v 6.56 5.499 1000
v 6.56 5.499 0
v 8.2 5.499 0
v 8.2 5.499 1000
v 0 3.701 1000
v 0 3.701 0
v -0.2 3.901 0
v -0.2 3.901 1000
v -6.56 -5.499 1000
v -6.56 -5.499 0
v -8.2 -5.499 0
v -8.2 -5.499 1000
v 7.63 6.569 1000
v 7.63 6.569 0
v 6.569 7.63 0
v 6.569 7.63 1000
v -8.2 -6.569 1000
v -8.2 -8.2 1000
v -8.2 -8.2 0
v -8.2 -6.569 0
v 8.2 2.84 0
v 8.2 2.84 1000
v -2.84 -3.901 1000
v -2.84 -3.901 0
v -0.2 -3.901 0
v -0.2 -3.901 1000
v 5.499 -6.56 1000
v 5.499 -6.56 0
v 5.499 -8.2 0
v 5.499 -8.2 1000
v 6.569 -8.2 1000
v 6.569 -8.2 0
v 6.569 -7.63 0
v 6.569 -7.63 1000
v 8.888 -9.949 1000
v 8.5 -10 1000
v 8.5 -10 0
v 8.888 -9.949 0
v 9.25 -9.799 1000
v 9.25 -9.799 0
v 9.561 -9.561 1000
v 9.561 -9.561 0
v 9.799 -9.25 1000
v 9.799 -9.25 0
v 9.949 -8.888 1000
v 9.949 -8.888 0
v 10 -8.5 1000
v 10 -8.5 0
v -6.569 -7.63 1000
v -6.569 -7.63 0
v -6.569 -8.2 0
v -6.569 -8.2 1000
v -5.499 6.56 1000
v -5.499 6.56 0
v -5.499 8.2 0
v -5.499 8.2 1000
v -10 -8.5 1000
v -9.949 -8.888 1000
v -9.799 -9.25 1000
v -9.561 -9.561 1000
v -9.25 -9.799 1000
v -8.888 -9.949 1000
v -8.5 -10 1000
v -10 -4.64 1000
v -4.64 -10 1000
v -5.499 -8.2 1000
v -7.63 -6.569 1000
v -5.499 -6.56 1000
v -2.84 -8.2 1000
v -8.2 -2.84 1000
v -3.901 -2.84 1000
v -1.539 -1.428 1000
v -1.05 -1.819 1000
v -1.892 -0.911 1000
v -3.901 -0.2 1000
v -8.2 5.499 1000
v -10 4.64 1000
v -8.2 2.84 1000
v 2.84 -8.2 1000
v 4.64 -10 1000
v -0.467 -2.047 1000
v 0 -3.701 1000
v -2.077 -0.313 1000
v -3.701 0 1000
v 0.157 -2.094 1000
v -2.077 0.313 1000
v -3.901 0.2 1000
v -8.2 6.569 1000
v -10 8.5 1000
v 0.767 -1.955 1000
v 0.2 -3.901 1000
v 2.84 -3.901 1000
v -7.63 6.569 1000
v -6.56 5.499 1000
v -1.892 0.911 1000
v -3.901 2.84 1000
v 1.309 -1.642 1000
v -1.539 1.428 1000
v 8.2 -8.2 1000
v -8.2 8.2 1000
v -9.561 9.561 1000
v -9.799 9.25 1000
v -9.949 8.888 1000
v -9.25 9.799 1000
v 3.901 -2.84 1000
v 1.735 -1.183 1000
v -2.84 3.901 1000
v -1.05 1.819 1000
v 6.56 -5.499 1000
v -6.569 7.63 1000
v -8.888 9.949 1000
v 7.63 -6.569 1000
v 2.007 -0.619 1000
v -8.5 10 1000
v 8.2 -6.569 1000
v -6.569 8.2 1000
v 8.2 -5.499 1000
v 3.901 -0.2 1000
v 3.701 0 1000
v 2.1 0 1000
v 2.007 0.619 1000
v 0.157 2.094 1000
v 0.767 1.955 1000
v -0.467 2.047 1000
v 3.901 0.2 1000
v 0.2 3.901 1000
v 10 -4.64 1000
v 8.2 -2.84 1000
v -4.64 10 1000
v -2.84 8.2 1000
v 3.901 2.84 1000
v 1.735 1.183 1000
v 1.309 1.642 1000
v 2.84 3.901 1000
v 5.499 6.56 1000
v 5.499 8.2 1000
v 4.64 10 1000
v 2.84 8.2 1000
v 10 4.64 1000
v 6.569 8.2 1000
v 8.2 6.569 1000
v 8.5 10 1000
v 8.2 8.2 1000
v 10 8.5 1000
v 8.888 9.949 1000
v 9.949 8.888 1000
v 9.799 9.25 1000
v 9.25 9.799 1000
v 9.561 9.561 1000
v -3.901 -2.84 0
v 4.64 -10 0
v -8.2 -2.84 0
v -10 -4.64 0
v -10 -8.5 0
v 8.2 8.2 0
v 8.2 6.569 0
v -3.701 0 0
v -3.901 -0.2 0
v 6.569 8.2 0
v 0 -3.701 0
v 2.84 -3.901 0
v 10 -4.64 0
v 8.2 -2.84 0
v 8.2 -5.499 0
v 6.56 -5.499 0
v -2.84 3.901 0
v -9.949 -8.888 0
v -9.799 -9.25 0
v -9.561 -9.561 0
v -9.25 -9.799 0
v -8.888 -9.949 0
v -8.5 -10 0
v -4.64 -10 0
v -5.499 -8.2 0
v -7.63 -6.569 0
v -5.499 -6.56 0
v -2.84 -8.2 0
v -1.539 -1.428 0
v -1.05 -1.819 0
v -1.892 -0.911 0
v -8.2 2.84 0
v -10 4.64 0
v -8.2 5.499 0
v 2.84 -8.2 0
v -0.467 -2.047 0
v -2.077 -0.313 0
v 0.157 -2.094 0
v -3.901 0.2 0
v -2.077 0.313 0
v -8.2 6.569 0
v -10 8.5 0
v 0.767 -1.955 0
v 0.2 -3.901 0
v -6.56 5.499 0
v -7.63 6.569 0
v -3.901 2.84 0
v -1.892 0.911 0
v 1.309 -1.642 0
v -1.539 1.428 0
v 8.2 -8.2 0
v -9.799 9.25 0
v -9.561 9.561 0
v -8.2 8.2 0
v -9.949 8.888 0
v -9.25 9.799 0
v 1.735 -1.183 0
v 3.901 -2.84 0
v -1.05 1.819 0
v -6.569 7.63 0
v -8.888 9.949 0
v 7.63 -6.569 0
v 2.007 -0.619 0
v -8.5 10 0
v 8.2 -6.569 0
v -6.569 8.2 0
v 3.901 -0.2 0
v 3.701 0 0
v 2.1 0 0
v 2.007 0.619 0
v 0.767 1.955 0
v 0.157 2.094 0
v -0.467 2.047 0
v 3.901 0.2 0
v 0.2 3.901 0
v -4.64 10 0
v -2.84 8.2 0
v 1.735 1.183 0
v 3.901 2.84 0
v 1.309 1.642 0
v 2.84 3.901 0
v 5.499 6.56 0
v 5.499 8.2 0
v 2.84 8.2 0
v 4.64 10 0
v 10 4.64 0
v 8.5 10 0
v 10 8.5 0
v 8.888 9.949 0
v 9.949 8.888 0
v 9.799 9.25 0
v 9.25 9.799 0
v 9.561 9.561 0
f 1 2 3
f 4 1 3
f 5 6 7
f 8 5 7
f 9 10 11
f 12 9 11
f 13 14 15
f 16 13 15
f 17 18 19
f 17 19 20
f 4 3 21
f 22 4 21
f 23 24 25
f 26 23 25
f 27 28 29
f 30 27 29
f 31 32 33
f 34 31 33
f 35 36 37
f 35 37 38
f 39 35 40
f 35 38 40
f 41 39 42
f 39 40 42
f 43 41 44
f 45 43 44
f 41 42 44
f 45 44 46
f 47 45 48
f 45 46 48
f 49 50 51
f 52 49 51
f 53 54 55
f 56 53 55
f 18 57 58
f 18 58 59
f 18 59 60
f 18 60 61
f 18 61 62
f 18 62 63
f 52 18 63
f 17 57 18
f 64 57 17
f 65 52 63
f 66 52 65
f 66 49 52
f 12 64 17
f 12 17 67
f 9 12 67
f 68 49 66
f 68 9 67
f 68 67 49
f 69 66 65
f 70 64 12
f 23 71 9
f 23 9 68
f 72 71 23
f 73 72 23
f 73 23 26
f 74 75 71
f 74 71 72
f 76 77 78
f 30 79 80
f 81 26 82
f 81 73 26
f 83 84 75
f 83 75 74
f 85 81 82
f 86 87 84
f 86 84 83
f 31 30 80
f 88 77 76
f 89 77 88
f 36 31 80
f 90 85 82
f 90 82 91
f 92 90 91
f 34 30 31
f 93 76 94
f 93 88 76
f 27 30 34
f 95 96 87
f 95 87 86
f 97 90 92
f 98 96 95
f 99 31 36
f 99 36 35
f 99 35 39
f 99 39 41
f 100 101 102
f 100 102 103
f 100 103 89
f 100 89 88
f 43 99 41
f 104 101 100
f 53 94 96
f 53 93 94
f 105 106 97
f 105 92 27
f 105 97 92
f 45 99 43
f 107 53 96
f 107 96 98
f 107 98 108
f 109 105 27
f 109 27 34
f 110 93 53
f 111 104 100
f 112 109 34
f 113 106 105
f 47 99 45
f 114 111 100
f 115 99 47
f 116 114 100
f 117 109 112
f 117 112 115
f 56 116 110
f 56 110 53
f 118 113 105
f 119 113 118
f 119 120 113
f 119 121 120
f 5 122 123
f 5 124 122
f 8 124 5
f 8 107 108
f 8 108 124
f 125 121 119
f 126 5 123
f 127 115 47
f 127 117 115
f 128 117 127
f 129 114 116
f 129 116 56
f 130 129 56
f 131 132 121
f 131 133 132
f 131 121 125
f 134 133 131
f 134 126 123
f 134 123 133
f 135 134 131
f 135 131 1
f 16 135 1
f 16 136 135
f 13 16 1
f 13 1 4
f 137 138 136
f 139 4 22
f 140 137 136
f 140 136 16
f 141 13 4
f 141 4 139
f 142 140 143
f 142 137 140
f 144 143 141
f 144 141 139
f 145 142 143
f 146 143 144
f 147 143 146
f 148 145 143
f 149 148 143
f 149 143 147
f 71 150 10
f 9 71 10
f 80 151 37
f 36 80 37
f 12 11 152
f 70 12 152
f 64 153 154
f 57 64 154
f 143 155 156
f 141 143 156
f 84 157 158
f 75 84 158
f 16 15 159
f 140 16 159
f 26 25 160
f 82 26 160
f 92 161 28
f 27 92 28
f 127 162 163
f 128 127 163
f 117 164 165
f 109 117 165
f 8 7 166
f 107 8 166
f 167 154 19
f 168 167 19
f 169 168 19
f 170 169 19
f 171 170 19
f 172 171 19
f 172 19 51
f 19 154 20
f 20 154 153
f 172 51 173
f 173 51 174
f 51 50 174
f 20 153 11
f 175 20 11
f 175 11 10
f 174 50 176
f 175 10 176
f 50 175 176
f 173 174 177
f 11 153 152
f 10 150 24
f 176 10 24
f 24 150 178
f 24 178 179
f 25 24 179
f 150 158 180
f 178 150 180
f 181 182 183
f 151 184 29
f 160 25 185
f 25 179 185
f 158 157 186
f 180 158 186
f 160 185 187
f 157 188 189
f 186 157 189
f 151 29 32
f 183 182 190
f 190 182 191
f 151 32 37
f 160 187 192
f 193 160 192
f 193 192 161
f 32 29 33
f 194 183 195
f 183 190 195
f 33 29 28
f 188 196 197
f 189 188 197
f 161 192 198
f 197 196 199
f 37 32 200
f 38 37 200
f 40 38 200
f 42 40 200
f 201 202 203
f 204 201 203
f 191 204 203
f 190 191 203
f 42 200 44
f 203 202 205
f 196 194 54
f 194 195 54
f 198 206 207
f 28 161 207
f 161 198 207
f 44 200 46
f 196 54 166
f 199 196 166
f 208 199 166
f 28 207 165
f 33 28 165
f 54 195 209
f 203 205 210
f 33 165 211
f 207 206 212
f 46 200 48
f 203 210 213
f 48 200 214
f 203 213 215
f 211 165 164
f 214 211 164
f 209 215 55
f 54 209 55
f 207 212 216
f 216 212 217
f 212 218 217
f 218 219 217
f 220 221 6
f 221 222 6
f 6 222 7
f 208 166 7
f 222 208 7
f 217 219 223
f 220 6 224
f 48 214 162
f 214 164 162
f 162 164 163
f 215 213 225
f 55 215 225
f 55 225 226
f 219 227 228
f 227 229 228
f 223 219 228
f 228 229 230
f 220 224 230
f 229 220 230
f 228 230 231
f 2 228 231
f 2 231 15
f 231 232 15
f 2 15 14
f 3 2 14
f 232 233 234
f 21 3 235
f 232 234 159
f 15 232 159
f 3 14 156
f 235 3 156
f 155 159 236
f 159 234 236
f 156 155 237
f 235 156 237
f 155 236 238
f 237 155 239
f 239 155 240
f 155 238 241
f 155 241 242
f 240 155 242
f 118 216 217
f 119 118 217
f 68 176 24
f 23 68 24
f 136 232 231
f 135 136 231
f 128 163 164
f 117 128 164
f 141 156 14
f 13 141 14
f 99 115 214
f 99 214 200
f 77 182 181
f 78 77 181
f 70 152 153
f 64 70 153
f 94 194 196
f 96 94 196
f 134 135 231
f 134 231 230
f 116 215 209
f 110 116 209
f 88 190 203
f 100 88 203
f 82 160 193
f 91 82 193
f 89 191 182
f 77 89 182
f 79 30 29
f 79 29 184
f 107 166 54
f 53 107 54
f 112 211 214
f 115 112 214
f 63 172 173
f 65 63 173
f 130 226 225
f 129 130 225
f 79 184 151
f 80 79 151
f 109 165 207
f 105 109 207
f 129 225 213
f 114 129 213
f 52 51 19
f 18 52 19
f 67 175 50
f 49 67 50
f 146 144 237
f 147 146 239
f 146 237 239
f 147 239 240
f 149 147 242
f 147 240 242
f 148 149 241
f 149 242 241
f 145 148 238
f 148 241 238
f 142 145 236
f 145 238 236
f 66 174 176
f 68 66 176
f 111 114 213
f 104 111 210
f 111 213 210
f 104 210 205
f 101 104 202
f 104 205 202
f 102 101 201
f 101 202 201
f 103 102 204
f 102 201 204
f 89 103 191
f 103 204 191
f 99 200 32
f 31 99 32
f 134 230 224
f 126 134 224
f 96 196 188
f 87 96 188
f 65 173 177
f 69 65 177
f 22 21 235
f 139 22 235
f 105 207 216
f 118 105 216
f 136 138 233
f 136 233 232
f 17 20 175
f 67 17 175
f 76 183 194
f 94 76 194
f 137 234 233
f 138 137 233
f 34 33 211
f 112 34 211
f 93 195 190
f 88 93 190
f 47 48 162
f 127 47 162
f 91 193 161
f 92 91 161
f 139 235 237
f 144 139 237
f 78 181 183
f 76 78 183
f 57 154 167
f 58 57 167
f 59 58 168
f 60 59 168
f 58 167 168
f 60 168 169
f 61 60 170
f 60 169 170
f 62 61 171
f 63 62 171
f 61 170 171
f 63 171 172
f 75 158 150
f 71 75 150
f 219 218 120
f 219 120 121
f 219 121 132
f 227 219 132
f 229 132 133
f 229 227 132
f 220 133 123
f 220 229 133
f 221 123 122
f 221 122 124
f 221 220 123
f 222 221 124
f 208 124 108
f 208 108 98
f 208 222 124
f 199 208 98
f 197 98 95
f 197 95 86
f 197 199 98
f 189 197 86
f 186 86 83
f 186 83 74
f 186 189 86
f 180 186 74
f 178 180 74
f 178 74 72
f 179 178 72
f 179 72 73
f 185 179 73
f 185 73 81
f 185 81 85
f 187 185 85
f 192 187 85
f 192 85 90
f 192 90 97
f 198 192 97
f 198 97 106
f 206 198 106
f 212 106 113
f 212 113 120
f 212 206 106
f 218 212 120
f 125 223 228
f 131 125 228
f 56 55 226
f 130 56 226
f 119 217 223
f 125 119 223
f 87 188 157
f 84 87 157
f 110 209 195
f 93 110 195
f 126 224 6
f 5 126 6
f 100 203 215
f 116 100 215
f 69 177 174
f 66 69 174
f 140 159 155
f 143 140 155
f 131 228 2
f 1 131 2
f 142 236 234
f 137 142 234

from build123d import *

# Parameters (mm, degrees)
F0_R     = 2.09999979
F1_DEPTH = 1000


# Not quite as in the source:
# - ends of sketch curves that miss each other by under 0.0002 mm in the source are joined


with BuildPart() as f1:
    # F0 (on Top) → F1 (new body)
    with BuildSketch(Plane.XY):
        with BuildLine():
            Line((-4.639999536, 10), (-8.50000015, 10))
            ThreePointArc((-8.50000015, 10), (-9.5606602157, 9.5606602157), (-10, 8.50000015))
            Line((-10, 8.50000015), (-10, 4.639999536))
            Line((-10, 4.639999536), (-8.19999818, 2.839999716))
            Line((-8.19999818, 2.839999716), (-8.19999818, 5.4993384501))
            Line((-8.19999818, 5.4993384501), (-6.559999344, 5.4993384501))
            Line((-6.559999344, 5.4993384501), (-3.9006596099, 2.839999716))
            Line((-3.9006596099, 2.839999716), (-3.9006596099, 0.19999898))
            Line((-3.9006596099, 0.19999898), (-3.7006596299, -1e-06))
            Line((-3.7006596299, -1e-06), (-3.9006596099, -0.20000098))
            Line((-3.9006596099, -0.20000098), (-3.9006596099, -2.840000716))
            Line((-3.9006596099, -2.840000716), (-6.559999344, -5.4993404501))
            Line((-6.559999344, -5.4993404501), (-8.19999818, -5.4993404501))
            Line((-8.19999818, -5.4993404501), (-8.19999818, -2.840000716))
            Line((-8.19999818, -2.840000716), (-10, -4.640000536))
            Line((-10, -4.640000536), (-10, -8.50000115))
            ThreePointArc((-10, -8.50000115), (-9.5606602157, -9.5606612157), (-8.50000015, -10.000001))
            Line((-8.50000015, -10.000001), (-4.639999536, -10))
            Line((-4.639999536, -10), (-2.839999716, -8.20000018))
            Line((-2.839999716, -8.20000018), (-5.4993394501, -8.20000018))
            Line((-5.4993394501, -8.20000018), (-5.4993394501, -6.560000344))
            Line((-5.4993394501, -6.560000344), (-2.839999716, -3.9006606099))
            Line((-2.839999716, -3.9006606099), (-0.19999898, -3.9006606099))
            Line((-0.19999898, -3.9006606099), (1e-06, -3.7006606299))
            Line((1e-06, -3.7006606299), (0.20000098, -3.9006606099))
            Line((0.20000098, -3.9006606099), (2.839999716, -3.9006606099))
            Line((2.839999716, -3.9006606099), (5.4993414501, -6.560000344))
            Line((5.4993414501, -6.560000344), (5.4993414501, -8.20000018))
            Line((5.4993414501, -8.20000018), (2.839999716, -8.20000018))
            Line((2.839999716, -8.20000018), (4.639999536, -10))
            Line((4.639999536, -10), (8.50000015, -10))
            ThreePointArc((8.50000015, -10), (9.5606602157, -9.5606612157), (10, -8.50000115))
            Line((10, -8.50000115), (10, -4.640000536))
            Line((10, -4.640000536), (8.20000018, -2.840000716))
            Line((8.20000018, -2.840000716), (8.20000018, -5.4993404501))
            Line((8.20000018, -5.4993404501), (6.560000344, -5.4993404501))
            Line((6.560000344, -5.4993404501), (3.9006596099, -2.840000716))
            Line((3.9006596099, -2.840000716), (3.9006596099, -0.20000098))
            Line((3.9006596099, -0.20000098), (3.7006596299, -1e-06))
            Line((3.7006596299, -1e-06), (3.9006596099, 0.19999898))
            Line((3.9006596099, 0.19999898), (3.9006596099, 2.839999716))
            Line((3.9006596099, 2.839999716), (6.560000344, 5.4993384501))
            Line((6.560000344, 5.4993384501), (8.20000018, 5.4993384501))
            Line((8.20000018, 5.4993384501), (8.20000018, 2.839999716))
            Line((8.20000018, 2.839999716), (10, 4.639999536))
            Line((10, 4.639999536), (10, 8.50000015))
            ThreePointArc((10, 8.50000015), (9.5606602157, 9.5606602157), (8.50000015, 10))
            Line((8.50000015, 10), (4.639999536, 10))
            Line((4.639999536, 10), (2.839999716, 8.20000018))
            Line((2.839999716, 8.20000018), (5.4993414501, 8.20000018))
            Line((5.4993414501, 8.20000018), (5.4993414501, 6.559998344))
            Line((5.4993414501, 6.559998344), (2.839999716, 3.9006596099))
            Line((2.839999716, 3.9006596099), (0.20000098, 3.9006596099))
            Line((0.20000098, 3.9006596099), (1e-06, 3.7006596299))
            Line((1e-06, 3.7006596299), (-0.19999898, 3.9006596099))
            Line((-0.19999898, 3.9006596099), (-2.839999716, 3.9006596099))
            Line((-2.839999716, 3.9006596099), (-5.4993394501, 6.559998344))
            Line((-5.4993394501, 6.559998344), (-5.4993394501, 8.20000018))
            Line((-5.4993394501, 8.20000018), (-2.839999716, 8.20000018))
            Line((-2.839999716, 8.20000018), (-4.639999536, 10))
        make_face()
        Polygon((-6.5693393431, -8.20000018), (-8.19999818, -8.20000018), (-8.19999818, -6.5693403431), (-7.629998237, -6.5693403431), (-6.5693393431, -7.630000237), align=None, mode=Mode.SUBTRACT)
        Polygon((8.20000018, -8.20000018), (6.5693393431, -8.20000018), (6.5693393431, -7.630000237), (7.630002237, -6.5693403431), (8.20000018, -6.5693403431), align=None, mode=Mode.SUBTRACT)
        with Locations((1e-06, -1e-06)):
            Circle(F0_R, mode=Mode.SUBTRACT)
        Polygon((-8.19999818, 8.20000018), (-6.5693393431, 8.20000018), (-6.5693393431, 7.629999237), (-7.629998237, 6.5693393431), (-8.19999818, 6.5693393431), align=None, mode=Mode.SUBTRACT)
        Polygon((6.5693393431, 8.20000018), (8.20000018, 8.20000018), (8.20000018, 6.5693393431), (7.630002237, 6.5693393431), (6.5693393431, 7.629999237), align=None, mode=Mode.SUBTRACT)
    extrude(amount=F1_DEPTH)


solid = f1.part
